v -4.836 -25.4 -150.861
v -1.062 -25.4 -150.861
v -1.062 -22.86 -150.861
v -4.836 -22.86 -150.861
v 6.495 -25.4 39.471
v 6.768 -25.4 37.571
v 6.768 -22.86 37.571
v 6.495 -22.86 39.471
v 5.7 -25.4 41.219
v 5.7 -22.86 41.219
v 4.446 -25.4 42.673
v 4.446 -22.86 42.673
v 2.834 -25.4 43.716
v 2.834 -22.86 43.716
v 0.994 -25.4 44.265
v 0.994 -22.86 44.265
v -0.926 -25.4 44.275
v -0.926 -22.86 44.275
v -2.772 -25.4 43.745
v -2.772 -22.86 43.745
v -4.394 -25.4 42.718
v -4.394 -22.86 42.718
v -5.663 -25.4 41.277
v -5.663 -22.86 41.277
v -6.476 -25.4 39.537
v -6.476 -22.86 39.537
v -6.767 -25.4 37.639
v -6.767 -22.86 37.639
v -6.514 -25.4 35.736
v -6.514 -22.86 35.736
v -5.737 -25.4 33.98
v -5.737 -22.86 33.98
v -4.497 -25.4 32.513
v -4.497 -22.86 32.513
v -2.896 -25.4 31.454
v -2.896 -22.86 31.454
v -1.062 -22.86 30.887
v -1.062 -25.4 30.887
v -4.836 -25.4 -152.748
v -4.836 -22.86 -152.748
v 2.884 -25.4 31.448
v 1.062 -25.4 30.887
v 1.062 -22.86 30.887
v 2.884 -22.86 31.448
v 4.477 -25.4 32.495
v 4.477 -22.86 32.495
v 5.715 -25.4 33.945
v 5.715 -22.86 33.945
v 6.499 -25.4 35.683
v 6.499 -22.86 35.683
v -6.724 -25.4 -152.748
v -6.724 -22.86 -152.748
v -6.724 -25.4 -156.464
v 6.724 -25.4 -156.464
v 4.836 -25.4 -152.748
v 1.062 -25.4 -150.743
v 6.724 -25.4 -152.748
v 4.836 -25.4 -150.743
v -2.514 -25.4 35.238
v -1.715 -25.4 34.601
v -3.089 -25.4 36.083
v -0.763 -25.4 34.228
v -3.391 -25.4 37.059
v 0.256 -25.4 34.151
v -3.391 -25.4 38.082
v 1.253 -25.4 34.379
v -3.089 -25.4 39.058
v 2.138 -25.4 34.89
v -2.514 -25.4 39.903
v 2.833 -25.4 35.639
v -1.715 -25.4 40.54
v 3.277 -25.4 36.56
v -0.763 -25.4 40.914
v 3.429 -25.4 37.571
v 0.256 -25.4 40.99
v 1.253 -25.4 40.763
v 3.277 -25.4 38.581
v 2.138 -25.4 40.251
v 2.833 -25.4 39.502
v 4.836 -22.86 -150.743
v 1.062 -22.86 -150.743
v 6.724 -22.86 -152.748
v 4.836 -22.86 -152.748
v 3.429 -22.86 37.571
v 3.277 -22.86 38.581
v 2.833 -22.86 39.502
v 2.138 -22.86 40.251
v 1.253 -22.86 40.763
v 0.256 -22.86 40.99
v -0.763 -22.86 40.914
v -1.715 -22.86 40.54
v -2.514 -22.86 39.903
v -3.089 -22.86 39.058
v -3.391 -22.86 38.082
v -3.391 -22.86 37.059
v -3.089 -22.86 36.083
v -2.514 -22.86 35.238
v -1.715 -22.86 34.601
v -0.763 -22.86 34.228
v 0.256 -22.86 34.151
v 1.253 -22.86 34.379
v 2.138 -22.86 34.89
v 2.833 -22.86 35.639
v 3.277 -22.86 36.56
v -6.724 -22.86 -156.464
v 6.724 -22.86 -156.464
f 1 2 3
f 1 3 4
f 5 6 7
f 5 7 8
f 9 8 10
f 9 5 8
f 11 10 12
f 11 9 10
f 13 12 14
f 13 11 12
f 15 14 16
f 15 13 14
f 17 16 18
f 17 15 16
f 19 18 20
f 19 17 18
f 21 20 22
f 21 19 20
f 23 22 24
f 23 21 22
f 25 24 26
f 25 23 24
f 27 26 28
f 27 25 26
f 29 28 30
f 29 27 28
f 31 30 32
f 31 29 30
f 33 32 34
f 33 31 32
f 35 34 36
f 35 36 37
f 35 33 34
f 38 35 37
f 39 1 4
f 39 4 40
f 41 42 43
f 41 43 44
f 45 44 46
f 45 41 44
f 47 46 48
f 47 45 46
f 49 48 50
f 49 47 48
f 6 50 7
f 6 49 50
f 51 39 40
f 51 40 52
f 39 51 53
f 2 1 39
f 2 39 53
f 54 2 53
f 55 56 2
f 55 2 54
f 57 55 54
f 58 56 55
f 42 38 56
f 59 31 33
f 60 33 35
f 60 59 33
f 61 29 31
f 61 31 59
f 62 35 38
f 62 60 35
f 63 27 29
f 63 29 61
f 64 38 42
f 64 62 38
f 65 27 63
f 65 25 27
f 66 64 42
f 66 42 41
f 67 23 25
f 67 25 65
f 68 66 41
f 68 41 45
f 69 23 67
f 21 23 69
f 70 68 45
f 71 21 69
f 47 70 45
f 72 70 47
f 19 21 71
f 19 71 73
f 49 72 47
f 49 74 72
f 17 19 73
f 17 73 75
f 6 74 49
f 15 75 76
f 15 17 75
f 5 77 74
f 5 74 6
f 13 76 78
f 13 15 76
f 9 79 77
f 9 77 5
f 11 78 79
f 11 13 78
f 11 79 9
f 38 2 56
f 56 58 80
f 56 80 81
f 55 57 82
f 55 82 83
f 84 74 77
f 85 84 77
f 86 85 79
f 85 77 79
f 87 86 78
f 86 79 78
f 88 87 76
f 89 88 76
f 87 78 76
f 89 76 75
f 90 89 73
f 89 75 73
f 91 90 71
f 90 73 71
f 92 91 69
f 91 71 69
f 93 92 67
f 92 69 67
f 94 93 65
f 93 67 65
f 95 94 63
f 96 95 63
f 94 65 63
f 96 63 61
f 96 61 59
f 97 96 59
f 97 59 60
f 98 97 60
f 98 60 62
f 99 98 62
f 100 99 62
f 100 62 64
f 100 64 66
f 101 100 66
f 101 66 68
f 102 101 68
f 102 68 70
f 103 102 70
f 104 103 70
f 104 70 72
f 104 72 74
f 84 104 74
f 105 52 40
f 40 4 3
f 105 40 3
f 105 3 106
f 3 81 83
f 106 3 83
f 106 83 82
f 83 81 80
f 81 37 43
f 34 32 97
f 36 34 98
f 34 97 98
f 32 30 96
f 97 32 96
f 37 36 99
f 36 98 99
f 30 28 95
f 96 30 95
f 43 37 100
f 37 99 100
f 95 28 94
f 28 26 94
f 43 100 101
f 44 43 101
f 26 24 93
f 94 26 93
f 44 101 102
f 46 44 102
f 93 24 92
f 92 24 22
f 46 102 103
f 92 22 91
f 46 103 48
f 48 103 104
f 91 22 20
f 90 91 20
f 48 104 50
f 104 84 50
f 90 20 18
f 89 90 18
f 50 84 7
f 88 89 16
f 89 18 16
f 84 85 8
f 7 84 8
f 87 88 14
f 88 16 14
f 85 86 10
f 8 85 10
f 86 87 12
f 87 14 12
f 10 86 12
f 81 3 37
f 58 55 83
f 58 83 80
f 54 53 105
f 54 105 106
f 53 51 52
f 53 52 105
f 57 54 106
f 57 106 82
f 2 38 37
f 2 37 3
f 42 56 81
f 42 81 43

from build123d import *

# Parameters (mm, degrees)
F1_R     = 3.429
F2_DEPTH = 2.54
F3_DEPTH = 25.4


# Not quite as in the source:
# - a feature names something its author has since deleted; it is built from what else it names


with BuildPart() as f2:
    # F1 (on offset) → F2 (new body)
    with BuildSketch(Plane.XZ.offset(25.4)):
        with BuildLine():
            Line((-6.7237908952, -152.7482020624), (-6.7237908952, -156.4639806747))
            Line((-6.7237908952, -156.4639806747), (-2.04e-07, -156.4639806747))
            Line((-2.04e-07, -156.4639806747), (6.7237904873, -156.4639806747))
            Line((6.7237904873, -156.4639806747), (6.7237904873, -152.7482020624))
            Line((6.7237904873, -152.7482020624), (4.8364107652, -152.7482020624))
            Line((4.8364107652, -152.7482020624), (4.8364107652, -150.8608219091))
            Line((4.8364107652, -150.8608219091), (4.8364107652, -150.7428611076))
            Line((4.8364107652, -150.7428611076), (1.0616511053, -150.7428611076))
            Line((1.0616511053, -150.7428611076), (1.0616511053, 30.8865145628))
            ThreePointArc((1.0616511053, 30.8865145628), (-2.065e-07, 30.802726532), (-1.0616515132, 30.8865146276))
            Line((-1.0616515132, 30.8865146276), (-1.0616515132, -150.7428611076))
            Line((-1.0616515132, -150.7428611076), (-1.0616515132, -150.8608219091))
            Line((-1.0616515132, -150.8608219091), (-4.8364111731, -150.8608219091))
            Line((-4.8364111731, -150.8608219091), (-4.8364111731, -152.7482020624))
            Line((-4.8364111731, -152.7482020624), (-6.7237908952, -152.7482020624))
        make_face()
        with BuildLine():
            ThreePointArc((6.7678133299, 37.5705398619), (-4.3942142646, 42.7177894445), (-1.0616515132, 30.8865146276))
            ThreePointArc((-1.0616515132, 30.8865146276), (-2.065e-07, 30.802726532), (1.0616511053, 30.8865145628))
            ThreePointArc((1.0616511053, 30.8865145628), (5.1472494485, 33.1763254403), (6.7678133299, 37.5705398619))
        make_face()
        with Locations((0, 37.5705398619)):
            Circle(F1_R, mode=Mode.SUBTRACT)
        with Locations((0, 37.5705398619)):
            Circle(F1_R)
    extrude(amount=-F2_DEPTH)

    # F1 (on offset) → F3 (cut)
    with BuildSketch(Plane.XZ.offset(25.4)):
        with Locations((0, 37.5705398619)):
            Circle(F1_R)
    extrude(amount=-F3_DEPTH, mode=Mode.SUBTRACT)


solid = f2.part
